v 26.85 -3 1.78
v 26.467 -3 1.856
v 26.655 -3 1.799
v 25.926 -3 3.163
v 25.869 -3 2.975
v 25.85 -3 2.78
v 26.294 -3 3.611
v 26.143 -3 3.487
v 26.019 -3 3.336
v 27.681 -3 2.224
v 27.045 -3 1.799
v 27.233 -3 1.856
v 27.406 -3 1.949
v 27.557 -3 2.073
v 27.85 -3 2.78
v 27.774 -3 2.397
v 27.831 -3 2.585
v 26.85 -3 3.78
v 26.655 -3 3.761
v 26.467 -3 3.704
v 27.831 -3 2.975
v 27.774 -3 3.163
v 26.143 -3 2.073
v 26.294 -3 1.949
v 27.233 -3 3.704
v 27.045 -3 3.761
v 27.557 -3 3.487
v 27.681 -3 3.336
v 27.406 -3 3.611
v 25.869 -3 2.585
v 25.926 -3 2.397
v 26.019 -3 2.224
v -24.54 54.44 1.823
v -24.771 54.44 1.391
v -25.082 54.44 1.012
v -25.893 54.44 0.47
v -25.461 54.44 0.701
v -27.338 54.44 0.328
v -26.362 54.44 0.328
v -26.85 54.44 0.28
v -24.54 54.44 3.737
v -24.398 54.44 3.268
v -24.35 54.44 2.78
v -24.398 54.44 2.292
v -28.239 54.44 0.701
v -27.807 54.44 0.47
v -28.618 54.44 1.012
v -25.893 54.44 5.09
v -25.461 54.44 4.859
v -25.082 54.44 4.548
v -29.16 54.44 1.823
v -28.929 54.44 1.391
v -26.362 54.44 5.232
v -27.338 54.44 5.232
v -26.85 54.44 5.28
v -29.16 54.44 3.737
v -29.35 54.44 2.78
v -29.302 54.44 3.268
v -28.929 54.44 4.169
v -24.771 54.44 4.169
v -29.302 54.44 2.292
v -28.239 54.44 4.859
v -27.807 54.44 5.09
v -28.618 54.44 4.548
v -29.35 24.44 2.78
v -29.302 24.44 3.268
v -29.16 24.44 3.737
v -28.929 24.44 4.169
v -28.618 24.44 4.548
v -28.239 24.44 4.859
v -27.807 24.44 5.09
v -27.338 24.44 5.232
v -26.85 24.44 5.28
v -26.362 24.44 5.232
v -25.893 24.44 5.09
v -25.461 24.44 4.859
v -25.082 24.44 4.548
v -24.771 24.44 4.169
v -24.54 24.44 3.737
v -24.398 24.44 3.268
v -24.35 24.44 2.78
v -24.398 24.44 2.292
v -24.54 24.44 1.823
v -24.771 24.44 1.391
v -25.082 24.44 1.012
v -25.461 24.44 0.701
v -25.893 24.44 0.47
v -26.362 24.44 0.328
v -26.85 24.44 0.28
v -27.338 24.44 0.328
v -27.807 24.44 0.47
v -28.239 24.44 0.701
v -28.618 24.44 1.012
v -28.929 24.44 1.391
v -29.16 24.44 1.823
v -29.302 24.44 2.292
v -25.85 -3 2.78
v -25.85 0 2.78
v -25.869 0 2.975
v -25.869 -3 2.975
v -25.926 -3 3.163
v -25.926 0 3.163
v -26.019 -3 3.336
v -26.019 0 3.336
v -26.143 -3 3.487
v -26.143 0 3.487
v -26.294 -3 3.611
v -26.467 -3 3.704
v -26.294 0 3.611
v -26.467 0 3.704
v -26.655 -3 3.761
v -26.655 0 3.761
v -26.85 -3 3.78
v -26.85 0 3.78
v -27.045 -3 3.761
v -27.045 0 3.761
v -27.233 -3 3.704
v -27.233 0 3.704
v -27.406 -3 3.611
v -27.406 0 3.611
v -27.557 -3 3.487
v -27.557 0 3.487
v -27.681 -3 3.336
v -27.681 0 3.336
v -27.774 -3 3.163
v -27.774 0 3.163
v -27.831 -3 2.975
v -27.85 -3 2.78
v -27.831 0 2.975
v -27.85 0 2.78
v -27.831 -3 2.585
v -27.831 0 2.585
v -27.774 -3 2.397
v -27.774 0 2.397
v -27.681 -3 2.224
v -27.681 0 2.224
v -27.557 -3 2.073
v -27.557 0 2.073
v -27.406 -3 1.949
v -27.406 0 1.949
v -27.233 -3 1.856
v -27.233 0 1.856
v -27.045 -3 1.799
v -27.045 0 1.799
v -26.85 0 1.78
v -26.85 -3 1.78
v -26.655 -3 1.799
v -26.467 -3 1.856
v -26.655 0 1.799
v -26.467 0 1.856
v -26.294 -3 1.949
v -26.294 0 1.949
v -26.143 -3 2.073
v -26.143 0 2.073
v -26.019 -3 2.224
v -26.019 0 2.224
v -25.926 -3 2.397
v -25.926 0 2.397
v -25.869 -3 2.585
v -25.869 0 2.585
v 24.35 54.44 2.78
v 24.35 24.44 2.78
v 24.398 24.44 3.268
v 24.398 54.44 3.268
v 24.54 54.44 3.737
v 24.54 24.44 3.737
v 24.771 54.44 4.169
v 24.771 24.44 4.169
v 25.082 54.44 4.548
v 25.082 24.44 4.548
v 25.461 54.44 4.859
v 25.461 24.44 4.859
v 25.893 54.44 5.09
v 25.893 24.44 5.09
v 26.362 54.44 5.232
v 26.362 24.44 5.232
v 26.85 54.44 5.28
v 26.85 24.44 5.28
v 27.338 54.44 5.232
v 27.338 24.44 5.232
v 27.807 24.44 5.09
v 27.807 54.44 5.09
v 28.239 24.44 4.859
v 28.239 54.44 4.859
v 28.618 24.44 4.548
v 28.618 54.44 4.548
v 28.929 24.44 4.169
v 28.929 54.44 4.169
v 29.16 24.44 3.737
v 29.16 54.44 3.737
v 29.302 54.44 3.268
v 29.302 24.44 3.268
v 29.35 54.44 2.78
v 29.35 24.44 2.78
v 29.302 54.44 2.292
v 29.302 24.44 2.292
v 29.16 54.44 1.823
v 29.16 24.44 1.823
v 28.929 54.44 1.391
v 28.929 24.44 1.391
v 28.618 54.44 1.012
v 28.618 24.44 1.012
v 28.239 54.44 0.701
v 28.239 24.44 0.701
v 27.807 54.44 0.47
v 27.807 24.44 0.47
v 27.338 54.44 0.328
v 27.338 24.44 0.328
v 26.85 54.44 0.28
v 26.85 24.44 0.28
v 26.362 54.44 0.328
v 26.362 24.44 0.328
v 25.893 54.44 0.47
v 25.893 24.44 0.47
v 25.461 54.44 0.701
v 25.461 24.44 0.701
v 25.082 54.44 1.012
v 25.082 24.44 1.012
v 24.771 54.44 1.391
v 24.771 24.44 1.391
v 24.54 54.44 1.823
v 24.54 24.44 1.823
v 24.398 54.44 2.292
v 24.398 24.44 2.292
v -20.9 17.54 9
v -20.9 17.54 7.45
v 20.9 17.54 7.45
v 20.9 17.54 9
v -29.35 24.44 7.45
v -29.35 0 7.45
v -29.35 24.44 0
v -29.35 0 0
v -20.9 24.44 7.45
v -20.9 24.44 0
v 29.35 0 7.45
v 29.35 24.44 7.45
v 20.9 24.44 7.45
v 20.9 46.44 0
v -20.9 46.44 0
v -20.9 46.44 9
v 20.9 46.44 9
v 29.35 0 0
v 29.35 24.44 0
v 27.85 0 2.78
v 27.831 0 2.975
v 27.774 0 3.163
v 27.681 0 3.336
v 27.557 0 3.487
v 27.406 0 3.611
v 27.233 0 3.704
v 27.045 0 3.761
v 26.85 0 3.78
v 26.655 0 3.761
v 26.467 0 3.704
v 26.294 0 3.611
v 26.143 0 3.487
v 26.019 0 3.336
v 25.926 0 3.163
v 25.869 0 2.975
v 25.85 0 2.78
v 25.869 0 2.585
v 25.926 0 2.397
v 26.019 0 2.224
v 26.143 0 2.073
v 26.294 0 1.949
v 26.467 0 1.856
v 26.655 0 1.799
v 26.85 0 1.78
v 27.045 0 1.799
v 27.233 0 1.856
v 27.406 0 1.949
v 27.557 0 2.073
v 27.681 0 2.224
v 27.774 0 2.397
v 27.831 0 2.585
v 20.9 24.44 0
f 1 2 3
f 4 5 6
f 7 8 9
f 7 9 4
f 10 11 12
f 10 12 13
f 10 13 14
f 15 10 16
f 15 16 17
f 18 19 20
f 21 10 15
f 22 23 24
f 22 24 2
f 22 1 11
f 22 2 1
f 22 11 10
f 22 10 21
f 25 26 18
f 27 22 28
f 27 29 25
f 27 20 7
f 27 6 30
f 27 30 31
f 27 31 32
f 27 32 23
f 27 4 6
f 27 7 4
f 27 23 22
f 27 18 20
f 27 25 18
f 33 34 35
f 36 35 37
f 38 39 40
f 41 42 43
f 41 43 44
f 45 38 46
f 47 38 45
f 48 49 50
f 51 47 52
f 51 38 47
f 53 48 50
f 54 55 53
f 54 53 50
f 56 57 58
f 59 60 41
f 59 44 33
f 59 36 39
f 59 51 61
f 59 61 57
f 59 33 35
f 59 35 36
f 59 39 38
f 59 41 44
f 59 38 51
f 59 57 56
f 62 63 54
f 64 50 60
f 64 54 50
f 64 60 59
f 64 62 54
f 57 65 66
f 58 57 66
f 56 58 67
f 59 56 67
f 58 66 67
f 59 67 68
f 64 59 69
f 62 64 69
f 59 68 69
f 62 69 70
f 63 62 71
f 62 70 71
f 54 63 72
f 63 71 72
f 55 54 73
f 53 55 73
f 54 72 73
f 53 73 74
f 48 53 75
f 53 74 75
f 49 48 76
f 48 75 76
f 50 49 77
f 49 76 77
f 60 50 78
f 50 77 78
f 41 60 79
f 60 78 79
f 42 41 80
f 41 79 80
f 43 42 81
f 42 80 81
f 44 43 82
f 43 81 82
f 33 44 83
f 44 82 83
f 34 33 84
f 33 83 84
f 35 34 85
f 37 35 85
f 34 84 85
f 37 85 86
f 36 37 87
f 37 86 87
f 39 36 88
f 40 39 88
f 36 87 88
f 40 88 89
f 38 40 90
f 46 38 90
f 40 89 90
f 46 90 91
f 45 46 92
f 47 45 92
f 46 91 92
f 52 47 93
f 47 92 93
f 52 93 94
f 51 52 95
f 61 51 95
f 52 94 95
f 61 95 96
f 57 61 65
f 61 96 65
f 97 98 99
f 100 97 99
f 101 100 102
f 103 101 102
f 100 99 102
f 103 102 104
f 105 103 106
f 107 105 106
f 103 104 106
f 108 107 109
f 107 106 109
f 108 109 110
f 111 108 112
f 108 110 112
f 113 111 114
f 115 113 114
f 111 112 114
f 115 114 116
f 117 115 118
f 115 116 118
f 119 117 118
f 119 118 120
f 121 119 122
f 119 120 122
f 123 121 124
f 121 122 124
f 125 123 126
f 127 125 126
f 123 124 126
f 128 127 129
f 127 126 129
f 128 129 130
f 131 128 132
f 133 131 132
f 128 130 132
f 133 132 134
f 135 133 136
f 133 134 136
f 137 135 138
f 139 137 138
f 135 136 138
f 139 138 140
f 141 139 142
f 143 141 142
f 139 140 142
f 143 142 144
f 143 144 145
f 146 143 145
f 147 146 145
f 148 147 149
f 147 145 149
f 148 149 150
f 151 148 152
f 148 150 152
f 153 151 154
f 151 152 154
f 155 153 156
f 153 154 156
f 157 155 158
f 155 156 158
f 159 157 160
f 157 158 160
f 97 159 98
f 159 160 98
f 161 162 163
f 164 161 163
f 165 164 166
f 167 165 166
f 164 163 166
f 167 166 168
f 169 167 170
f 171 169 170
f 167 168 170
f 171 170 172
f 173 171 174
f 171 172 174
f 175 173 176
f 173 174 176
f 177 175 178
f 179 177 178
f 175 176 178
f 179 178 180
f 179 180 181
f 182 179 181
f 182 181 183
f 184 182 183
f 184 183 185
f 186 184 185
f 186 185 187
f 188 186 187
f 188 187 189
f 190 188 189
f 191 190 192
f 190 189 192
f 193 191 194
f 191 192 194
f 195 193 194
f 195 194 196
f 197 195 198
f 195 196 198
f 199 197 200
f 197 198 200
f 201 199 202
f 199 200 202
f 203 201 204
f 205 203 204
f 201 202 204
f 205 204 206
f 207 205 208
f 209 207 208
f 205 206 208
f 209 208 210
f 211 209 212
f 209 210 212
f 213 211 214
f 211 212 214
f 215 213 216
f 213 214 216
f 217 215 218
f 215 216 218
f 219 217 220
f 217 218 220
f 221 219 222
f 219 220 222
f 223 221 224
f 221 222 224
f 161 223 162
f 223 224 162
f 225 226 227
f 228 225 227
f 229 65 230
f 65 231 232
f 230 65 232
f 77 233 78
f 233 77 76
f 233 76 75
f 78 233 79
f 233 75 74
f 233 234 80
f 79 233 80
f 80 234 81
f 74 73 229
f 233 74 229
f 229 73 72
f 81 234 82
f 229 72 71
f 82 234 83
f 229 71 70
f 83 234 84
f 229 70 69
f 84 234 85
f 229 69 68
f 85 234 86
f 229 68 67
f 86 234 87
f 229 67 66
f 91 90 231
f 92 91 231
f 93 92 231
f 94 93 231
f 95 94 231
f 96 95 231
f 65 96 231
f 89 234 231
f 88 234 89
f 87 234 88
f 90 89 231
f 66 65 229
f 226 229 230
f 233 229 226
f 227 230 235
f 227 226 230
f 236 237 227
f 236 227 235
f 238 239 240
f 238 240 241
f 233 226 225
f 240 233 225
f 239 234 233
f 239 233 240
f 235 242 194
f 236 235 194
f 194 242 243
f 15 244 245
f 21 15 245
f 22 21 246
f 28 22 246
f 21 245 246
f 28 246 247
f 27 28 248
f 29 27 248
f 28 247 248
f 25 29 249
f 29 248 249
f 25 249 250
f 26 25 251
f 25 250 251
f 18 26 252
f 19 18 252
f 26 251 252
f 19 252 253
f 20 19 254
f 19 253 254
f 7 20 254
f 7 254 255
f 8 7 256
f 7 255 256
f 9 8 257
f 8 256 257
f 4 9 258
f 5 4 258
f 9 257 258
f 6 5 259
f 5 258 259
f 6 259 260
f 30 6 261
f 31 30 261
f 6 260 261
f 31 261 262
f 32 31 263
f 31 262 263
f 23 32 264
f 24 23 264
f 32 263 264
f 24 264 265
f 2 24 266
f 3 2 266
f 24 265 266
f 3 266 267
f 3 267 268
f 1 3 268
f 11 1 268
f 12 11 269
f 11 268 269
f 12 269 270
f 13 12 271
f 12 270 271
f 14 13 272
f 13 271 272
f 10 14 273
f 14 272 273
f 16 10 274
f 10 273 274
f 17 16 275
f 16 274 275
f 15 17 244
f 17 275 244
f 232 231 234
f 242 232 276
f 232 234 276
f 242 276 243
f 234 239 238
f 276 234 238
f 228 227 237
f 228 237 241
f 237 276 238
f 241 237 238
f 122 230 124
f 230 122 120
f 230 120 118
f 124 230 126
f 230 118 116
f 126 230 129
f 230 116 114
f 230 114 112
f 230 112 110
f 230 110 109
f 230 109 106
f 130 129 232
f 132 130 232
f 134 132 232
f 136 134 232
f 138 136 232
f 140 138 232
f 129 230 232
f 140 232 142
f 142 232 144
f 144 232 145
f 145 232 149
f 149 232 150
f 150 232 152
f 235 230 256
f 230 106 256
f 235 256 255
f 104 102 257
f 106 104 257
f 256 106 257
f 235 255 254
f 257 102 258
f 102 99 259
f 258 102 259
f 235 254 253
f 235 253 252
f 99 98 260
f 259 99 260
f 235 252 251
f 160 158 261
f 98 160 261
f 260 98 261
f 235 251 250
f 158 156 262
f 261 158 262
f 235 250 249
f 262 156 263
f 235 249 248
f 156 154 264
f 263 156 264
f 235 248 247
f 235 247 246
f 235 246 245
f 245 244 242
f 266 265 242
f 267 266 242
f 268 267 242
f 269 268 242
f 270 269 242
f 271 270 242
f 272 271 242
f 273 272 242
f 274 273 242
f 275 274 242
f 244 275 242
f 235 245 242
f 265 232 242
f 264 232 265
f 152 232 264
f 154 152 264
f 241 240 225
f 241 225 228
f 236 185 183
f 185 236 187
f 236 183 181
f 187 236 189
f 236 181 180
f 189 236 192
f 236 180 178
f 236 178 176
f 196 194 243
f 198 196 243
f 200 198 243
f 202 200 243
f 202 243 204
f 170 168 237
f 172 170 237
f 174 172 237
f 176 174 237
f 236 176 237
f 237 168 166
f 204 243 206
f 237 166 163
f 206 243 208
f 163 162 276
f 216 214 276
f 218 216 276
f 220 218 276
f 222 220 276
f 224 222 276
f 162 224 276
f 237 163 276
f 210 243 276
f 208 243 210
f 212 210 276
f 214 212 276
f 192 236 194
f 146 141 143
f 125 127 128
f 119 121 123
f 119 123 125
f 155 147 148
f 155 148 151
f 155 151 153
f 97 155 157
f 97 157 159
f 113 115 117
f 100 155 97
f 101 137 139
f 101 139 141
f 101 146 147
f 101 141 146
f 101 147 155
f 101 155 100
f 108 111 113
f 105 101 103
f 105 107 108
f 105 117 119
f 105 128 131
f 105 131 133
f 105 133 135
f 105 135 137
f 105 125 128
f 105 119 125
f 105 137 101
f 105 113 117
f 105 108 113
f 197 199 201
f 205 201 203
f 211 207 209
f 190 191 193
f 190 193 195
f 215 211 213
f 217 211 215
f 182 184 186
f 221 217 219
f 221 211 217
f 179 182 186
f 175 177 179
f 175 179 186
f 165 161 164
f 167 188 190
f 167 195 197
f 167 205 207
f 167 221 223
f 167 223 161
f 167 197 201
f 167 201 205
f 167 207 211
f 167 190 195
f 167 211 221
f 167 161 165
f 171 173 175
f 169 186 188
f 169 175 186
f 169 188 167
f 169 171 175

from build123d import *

# Parameters (mm, degrees)
F0_W     = 41.8
F0_H     = 22
F1_DEPTH = 7.45
F2_W     = 41.8
F2_H     = 28.9
F3_DEPTH = 1.55
F4_R     = 1
F5_DEPTH = 3
F6_R     = 2.5
F7_DEPTH = 30


with BuildPart() as f1:
    # F0 (on Top) → F1 (new body)
    with BuildSketch(Plane.XY):
        Polygon((-29.35, 0), (29.35, 0), (29.35, 24.44), (20.9, 24.44), (-20.9, 24.44), (-29.35, 24.44), align=None)
        with Locations((0, 35.44)):
            Rectangle(F0_W, F0_H)
    extrude(amount=F1_DEPTH)

    # F2 (on face) → F3 (join)
    with BuildSketch(Plane.XY.offset(7.45)):
        with Locations((0, 31.99)):
            Rectangle(F2_W, F2_H)
    extrude(amount=F3_DEPTH)

    # F4 (on face) → F5 (join)
    with BuildSketch(Plane.XZ):
        with Locations((-26.85, 2.78)):
            Circle(F4_R)
        with Locations((26.85, 2.78)):
            Circle(F4_R)
    extrude(amount=F5_DEPTH)

    # F6 (on face) → F7 (join)
    with BuildSketch(Plane(origin=(0, 24.44, 0), x_dir=(-1, 0, 0), z_dir=(0, 1, 0))):
        with Locations((-26.85, 2.78)):
            Circle(F6_R)
        with Locations((26.85, 2.78)):
            Circle(F6_R)
    extrude(amount=F7_DEPTH)


solid = f1.part
